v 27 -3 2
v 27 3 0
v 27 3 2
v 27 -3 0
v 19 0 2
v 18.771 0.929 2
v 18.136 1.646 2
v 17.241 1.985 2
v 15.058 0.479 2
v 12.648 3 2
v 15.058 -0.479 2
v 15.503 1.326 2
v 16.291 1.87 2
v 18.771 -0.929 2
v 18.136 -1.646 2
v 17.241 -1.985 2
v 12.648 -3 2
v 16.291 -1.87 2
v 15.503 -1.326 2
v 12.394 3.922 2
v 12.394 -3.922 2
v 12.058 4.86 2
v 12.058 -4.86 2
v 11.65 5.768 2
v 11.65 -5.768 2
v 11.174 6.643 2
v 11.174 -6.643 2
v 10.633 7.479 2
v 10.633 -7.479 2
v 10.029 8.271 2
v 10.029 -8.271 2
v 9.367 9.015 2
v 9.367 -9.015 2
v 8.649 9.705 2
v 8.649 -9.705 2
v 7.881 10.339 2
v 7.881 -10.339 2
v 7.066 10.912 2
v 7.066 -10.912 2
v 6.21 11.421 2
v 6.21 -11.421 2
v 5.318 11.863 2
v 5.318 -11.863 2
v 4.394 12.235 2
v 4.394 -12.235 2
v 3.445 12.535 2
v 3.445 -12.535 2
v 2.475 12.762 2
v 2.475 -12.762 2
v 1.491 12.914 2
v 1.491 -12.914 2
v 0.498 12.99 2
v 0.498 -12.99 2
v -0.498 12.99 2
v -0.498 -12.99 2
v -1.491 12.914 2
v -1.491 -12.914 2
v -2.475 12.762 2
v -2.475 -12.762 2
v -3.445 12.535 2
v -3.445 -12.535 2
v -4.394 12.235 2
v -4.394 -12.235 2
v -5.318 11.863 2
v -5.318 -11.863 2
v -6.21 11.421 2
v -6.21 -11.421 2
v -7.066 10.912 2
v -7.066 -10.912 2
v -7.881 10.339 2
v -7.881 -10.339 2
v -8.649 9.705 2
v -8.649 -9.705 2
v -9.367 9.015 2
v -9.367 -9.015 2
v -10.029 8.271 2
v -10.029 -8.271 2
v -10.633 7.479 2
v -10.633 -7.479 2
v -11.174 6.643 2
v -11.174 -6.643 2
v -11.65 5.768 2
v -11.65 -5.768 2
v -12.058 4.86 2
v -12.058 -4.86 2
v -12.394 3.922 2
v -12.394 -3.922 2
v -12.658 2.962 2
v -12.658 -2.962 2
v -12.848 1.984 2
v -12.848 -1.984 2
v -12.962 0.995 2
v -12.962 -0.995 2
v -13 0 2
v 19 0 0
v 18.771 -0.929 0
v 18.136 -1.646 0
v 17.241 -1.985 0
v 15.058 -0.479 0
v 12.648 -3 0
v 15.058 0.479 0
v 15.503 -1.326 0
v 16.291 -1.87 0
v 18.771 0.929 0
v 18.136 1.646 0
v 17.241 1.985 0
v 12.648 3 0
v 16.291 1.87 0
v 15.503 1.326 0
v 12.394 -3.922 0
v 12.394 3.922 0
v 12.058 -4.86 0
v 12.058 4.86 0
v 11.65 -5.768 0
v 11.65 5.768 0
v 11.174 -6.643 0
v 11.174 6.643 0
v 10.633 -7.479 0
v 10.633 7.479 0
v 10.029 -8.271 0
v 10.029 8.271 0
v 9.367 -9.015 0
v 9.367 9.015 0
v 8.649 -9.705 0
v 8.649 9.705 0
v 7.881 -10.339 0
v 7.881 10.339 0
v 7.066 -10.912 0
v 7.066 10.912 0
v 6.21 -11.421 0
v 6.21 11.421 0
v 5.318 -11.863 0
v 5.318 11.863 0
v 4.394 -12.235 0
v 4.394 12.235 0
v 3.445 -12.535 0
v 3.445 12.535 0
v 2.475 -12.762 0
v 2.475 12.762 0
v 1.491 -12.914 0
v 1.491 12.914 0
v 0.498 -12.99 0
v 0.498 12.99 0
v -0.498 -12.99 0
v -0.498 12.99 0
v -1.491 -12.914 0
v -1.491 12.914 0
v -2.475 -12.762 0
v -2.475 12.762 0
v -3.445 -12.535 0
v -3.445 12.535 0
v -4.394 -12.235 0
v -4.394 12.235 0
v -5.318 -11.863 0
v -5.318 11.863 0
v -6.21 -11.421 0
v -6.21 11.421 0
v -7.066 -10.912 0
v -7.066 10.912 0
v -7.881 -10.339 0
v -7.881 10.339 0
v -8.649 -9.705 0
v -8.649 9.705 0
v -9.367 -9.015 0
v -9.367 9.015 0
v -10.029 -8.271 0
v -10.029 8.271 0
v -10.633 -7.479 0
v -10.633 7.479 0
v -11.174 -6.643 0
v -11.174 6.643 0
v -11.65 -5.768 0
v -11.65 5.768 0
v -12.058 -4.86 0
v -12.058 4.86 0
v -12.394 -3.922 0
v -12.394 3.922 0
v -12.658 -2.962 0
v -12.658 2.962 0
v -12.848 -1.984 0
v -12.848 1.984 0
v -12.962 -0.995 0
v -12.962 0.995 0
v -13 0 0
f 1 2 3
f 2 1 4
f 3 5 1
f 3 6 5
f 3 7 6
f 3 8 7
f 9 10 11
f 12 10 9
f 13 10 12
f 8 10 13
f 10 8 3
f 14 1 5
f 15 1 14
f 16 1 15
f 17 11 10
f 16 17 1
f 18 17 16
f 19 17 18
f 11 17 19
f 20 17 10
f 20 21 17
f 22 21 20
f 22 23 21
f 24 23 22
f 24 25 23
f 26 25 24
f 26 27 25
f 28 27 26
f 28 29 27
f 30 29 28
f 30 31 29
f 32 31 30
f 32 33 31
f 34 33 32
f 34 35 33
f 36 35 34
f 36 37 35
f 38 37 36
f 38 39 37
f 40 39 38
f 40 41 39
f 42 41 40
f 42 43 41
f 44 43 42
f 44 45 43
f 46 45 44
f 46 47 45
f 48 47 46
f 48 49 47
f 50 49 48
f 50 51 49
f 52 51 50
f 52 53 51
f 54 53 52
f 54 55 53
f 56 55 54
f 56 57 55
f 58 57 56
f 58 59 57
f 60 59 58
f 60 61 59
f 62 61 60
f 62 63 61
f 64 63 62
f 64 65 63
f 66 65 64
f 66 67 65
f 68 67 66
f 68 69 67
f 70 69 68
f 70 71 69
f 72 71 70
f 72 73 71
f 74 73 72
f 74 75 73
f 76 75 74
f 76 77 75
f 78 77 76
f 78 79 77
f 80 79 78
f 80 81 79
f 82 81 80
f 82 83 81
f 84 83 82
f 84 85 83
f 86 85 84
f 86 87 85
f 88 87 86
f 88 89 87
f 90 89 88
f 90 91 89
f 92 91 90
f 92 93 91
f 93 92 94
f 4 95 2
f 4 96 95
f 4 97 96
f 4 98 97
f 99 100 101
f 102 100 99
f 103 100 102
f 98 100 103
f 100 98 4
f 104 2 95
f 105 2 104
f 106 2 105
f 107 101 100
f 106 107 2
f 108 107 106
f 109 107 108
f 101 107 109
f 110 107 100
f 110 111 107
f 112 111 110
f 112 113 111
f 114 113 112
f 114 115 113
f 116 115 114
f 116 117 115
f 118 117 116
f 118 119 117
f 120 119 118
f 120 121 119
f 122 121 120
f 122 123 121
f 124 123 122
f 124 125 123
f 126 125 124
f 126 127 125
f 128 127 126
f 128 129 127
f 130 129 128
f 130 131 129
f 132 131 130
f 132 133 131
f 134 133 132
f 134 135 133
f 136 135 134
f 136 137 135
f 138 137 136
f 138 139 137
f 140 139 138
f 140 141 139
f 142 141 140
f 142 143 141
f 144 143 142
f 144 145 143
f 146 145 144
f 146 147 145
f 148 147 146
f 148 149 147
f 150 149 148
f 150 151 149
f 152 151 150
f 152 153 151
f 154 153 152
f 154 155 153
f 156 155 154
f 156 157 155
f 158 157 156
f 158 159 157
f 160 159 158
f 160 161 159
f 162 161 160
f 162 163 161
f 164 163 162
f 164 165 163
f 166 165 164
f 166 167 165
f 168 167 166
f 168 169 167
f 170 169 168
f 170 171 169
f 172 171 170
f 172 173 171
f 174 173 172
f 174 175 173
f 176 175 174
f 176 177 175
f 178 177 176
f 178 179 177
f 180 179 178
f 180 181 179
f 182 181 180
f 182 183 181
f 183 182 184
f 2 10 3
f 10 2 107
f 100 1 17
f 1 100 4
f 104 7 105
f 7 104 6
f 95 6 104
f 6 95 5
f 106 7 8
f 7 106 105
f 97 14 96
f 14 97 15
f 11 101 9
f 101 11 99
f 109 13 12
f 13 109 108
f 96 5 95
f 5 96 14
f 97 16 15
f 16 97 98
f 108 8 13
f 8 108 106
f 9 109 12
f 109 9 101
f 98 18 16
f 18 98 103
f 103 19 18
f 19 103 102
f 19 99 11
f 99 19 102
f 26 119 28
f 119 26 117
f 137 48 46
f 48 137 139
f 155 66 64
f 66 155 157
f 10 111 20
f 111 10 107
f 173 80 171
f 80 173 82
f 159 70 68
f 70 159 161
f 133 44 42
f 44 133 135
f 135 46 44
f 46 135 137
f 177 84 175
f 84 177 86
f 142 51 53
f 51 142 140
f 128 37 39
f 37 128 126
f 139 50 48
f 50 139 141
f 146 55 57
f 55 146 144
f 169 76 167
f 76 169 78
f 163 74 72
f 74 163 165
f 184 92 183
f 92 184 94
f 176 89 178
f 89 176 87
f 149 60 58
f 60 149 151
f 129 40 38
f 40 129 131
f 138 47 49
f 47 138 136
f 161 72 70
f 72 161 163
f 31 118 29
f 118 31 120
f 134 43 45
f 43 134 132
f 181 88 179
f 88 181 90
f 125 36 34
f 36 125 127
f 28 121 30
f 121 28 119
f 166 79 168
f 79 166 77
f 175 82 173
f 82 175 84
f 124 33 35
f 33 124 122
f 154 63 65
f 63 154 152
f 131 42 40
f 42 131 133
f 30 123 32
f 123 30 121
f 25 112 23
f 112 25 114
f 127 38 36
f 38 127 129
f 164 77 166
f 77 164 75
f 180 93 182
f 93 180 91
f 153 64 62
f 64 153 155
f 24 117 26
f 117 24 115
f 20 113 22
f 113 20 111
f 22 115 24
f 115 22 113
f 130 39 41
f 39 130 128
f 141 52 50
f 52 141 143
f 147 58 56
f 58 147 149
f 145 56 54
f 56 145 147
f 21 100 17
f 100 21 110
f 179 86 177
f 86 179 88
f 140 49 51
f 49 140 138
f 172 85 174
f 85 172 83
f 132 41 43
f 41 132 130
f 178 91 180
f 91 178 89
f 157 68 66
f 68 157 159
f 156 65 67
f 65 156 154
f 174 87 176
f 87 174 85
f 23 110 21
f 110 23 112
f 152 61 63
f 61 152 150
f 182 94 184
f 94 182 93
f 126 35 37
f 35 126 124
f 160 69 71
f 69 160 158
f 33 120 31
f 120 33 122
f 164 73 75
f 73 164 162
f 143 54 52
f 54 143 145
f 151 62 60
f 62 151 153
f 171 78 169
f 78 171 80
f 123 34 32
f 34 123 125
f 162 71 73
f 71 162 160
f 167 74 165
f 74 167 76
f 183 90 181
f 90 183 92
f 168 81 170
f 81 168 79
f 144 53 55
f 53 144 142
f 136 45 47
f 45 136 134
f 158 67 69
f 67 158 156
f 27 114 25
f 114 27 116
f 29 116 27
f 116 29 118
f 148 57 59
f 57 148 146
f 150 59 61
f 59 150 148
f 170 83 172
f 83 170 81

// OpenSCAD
$fa = 0.1;
$fs = 1;
cylinder(r=13, h=2);
translate([12, -3, 0]){
    difference(){
        cube([15,6,2]);
        translate([5,3,0]) {
        cylinder(r=2, h=2);
        }
    }
}
